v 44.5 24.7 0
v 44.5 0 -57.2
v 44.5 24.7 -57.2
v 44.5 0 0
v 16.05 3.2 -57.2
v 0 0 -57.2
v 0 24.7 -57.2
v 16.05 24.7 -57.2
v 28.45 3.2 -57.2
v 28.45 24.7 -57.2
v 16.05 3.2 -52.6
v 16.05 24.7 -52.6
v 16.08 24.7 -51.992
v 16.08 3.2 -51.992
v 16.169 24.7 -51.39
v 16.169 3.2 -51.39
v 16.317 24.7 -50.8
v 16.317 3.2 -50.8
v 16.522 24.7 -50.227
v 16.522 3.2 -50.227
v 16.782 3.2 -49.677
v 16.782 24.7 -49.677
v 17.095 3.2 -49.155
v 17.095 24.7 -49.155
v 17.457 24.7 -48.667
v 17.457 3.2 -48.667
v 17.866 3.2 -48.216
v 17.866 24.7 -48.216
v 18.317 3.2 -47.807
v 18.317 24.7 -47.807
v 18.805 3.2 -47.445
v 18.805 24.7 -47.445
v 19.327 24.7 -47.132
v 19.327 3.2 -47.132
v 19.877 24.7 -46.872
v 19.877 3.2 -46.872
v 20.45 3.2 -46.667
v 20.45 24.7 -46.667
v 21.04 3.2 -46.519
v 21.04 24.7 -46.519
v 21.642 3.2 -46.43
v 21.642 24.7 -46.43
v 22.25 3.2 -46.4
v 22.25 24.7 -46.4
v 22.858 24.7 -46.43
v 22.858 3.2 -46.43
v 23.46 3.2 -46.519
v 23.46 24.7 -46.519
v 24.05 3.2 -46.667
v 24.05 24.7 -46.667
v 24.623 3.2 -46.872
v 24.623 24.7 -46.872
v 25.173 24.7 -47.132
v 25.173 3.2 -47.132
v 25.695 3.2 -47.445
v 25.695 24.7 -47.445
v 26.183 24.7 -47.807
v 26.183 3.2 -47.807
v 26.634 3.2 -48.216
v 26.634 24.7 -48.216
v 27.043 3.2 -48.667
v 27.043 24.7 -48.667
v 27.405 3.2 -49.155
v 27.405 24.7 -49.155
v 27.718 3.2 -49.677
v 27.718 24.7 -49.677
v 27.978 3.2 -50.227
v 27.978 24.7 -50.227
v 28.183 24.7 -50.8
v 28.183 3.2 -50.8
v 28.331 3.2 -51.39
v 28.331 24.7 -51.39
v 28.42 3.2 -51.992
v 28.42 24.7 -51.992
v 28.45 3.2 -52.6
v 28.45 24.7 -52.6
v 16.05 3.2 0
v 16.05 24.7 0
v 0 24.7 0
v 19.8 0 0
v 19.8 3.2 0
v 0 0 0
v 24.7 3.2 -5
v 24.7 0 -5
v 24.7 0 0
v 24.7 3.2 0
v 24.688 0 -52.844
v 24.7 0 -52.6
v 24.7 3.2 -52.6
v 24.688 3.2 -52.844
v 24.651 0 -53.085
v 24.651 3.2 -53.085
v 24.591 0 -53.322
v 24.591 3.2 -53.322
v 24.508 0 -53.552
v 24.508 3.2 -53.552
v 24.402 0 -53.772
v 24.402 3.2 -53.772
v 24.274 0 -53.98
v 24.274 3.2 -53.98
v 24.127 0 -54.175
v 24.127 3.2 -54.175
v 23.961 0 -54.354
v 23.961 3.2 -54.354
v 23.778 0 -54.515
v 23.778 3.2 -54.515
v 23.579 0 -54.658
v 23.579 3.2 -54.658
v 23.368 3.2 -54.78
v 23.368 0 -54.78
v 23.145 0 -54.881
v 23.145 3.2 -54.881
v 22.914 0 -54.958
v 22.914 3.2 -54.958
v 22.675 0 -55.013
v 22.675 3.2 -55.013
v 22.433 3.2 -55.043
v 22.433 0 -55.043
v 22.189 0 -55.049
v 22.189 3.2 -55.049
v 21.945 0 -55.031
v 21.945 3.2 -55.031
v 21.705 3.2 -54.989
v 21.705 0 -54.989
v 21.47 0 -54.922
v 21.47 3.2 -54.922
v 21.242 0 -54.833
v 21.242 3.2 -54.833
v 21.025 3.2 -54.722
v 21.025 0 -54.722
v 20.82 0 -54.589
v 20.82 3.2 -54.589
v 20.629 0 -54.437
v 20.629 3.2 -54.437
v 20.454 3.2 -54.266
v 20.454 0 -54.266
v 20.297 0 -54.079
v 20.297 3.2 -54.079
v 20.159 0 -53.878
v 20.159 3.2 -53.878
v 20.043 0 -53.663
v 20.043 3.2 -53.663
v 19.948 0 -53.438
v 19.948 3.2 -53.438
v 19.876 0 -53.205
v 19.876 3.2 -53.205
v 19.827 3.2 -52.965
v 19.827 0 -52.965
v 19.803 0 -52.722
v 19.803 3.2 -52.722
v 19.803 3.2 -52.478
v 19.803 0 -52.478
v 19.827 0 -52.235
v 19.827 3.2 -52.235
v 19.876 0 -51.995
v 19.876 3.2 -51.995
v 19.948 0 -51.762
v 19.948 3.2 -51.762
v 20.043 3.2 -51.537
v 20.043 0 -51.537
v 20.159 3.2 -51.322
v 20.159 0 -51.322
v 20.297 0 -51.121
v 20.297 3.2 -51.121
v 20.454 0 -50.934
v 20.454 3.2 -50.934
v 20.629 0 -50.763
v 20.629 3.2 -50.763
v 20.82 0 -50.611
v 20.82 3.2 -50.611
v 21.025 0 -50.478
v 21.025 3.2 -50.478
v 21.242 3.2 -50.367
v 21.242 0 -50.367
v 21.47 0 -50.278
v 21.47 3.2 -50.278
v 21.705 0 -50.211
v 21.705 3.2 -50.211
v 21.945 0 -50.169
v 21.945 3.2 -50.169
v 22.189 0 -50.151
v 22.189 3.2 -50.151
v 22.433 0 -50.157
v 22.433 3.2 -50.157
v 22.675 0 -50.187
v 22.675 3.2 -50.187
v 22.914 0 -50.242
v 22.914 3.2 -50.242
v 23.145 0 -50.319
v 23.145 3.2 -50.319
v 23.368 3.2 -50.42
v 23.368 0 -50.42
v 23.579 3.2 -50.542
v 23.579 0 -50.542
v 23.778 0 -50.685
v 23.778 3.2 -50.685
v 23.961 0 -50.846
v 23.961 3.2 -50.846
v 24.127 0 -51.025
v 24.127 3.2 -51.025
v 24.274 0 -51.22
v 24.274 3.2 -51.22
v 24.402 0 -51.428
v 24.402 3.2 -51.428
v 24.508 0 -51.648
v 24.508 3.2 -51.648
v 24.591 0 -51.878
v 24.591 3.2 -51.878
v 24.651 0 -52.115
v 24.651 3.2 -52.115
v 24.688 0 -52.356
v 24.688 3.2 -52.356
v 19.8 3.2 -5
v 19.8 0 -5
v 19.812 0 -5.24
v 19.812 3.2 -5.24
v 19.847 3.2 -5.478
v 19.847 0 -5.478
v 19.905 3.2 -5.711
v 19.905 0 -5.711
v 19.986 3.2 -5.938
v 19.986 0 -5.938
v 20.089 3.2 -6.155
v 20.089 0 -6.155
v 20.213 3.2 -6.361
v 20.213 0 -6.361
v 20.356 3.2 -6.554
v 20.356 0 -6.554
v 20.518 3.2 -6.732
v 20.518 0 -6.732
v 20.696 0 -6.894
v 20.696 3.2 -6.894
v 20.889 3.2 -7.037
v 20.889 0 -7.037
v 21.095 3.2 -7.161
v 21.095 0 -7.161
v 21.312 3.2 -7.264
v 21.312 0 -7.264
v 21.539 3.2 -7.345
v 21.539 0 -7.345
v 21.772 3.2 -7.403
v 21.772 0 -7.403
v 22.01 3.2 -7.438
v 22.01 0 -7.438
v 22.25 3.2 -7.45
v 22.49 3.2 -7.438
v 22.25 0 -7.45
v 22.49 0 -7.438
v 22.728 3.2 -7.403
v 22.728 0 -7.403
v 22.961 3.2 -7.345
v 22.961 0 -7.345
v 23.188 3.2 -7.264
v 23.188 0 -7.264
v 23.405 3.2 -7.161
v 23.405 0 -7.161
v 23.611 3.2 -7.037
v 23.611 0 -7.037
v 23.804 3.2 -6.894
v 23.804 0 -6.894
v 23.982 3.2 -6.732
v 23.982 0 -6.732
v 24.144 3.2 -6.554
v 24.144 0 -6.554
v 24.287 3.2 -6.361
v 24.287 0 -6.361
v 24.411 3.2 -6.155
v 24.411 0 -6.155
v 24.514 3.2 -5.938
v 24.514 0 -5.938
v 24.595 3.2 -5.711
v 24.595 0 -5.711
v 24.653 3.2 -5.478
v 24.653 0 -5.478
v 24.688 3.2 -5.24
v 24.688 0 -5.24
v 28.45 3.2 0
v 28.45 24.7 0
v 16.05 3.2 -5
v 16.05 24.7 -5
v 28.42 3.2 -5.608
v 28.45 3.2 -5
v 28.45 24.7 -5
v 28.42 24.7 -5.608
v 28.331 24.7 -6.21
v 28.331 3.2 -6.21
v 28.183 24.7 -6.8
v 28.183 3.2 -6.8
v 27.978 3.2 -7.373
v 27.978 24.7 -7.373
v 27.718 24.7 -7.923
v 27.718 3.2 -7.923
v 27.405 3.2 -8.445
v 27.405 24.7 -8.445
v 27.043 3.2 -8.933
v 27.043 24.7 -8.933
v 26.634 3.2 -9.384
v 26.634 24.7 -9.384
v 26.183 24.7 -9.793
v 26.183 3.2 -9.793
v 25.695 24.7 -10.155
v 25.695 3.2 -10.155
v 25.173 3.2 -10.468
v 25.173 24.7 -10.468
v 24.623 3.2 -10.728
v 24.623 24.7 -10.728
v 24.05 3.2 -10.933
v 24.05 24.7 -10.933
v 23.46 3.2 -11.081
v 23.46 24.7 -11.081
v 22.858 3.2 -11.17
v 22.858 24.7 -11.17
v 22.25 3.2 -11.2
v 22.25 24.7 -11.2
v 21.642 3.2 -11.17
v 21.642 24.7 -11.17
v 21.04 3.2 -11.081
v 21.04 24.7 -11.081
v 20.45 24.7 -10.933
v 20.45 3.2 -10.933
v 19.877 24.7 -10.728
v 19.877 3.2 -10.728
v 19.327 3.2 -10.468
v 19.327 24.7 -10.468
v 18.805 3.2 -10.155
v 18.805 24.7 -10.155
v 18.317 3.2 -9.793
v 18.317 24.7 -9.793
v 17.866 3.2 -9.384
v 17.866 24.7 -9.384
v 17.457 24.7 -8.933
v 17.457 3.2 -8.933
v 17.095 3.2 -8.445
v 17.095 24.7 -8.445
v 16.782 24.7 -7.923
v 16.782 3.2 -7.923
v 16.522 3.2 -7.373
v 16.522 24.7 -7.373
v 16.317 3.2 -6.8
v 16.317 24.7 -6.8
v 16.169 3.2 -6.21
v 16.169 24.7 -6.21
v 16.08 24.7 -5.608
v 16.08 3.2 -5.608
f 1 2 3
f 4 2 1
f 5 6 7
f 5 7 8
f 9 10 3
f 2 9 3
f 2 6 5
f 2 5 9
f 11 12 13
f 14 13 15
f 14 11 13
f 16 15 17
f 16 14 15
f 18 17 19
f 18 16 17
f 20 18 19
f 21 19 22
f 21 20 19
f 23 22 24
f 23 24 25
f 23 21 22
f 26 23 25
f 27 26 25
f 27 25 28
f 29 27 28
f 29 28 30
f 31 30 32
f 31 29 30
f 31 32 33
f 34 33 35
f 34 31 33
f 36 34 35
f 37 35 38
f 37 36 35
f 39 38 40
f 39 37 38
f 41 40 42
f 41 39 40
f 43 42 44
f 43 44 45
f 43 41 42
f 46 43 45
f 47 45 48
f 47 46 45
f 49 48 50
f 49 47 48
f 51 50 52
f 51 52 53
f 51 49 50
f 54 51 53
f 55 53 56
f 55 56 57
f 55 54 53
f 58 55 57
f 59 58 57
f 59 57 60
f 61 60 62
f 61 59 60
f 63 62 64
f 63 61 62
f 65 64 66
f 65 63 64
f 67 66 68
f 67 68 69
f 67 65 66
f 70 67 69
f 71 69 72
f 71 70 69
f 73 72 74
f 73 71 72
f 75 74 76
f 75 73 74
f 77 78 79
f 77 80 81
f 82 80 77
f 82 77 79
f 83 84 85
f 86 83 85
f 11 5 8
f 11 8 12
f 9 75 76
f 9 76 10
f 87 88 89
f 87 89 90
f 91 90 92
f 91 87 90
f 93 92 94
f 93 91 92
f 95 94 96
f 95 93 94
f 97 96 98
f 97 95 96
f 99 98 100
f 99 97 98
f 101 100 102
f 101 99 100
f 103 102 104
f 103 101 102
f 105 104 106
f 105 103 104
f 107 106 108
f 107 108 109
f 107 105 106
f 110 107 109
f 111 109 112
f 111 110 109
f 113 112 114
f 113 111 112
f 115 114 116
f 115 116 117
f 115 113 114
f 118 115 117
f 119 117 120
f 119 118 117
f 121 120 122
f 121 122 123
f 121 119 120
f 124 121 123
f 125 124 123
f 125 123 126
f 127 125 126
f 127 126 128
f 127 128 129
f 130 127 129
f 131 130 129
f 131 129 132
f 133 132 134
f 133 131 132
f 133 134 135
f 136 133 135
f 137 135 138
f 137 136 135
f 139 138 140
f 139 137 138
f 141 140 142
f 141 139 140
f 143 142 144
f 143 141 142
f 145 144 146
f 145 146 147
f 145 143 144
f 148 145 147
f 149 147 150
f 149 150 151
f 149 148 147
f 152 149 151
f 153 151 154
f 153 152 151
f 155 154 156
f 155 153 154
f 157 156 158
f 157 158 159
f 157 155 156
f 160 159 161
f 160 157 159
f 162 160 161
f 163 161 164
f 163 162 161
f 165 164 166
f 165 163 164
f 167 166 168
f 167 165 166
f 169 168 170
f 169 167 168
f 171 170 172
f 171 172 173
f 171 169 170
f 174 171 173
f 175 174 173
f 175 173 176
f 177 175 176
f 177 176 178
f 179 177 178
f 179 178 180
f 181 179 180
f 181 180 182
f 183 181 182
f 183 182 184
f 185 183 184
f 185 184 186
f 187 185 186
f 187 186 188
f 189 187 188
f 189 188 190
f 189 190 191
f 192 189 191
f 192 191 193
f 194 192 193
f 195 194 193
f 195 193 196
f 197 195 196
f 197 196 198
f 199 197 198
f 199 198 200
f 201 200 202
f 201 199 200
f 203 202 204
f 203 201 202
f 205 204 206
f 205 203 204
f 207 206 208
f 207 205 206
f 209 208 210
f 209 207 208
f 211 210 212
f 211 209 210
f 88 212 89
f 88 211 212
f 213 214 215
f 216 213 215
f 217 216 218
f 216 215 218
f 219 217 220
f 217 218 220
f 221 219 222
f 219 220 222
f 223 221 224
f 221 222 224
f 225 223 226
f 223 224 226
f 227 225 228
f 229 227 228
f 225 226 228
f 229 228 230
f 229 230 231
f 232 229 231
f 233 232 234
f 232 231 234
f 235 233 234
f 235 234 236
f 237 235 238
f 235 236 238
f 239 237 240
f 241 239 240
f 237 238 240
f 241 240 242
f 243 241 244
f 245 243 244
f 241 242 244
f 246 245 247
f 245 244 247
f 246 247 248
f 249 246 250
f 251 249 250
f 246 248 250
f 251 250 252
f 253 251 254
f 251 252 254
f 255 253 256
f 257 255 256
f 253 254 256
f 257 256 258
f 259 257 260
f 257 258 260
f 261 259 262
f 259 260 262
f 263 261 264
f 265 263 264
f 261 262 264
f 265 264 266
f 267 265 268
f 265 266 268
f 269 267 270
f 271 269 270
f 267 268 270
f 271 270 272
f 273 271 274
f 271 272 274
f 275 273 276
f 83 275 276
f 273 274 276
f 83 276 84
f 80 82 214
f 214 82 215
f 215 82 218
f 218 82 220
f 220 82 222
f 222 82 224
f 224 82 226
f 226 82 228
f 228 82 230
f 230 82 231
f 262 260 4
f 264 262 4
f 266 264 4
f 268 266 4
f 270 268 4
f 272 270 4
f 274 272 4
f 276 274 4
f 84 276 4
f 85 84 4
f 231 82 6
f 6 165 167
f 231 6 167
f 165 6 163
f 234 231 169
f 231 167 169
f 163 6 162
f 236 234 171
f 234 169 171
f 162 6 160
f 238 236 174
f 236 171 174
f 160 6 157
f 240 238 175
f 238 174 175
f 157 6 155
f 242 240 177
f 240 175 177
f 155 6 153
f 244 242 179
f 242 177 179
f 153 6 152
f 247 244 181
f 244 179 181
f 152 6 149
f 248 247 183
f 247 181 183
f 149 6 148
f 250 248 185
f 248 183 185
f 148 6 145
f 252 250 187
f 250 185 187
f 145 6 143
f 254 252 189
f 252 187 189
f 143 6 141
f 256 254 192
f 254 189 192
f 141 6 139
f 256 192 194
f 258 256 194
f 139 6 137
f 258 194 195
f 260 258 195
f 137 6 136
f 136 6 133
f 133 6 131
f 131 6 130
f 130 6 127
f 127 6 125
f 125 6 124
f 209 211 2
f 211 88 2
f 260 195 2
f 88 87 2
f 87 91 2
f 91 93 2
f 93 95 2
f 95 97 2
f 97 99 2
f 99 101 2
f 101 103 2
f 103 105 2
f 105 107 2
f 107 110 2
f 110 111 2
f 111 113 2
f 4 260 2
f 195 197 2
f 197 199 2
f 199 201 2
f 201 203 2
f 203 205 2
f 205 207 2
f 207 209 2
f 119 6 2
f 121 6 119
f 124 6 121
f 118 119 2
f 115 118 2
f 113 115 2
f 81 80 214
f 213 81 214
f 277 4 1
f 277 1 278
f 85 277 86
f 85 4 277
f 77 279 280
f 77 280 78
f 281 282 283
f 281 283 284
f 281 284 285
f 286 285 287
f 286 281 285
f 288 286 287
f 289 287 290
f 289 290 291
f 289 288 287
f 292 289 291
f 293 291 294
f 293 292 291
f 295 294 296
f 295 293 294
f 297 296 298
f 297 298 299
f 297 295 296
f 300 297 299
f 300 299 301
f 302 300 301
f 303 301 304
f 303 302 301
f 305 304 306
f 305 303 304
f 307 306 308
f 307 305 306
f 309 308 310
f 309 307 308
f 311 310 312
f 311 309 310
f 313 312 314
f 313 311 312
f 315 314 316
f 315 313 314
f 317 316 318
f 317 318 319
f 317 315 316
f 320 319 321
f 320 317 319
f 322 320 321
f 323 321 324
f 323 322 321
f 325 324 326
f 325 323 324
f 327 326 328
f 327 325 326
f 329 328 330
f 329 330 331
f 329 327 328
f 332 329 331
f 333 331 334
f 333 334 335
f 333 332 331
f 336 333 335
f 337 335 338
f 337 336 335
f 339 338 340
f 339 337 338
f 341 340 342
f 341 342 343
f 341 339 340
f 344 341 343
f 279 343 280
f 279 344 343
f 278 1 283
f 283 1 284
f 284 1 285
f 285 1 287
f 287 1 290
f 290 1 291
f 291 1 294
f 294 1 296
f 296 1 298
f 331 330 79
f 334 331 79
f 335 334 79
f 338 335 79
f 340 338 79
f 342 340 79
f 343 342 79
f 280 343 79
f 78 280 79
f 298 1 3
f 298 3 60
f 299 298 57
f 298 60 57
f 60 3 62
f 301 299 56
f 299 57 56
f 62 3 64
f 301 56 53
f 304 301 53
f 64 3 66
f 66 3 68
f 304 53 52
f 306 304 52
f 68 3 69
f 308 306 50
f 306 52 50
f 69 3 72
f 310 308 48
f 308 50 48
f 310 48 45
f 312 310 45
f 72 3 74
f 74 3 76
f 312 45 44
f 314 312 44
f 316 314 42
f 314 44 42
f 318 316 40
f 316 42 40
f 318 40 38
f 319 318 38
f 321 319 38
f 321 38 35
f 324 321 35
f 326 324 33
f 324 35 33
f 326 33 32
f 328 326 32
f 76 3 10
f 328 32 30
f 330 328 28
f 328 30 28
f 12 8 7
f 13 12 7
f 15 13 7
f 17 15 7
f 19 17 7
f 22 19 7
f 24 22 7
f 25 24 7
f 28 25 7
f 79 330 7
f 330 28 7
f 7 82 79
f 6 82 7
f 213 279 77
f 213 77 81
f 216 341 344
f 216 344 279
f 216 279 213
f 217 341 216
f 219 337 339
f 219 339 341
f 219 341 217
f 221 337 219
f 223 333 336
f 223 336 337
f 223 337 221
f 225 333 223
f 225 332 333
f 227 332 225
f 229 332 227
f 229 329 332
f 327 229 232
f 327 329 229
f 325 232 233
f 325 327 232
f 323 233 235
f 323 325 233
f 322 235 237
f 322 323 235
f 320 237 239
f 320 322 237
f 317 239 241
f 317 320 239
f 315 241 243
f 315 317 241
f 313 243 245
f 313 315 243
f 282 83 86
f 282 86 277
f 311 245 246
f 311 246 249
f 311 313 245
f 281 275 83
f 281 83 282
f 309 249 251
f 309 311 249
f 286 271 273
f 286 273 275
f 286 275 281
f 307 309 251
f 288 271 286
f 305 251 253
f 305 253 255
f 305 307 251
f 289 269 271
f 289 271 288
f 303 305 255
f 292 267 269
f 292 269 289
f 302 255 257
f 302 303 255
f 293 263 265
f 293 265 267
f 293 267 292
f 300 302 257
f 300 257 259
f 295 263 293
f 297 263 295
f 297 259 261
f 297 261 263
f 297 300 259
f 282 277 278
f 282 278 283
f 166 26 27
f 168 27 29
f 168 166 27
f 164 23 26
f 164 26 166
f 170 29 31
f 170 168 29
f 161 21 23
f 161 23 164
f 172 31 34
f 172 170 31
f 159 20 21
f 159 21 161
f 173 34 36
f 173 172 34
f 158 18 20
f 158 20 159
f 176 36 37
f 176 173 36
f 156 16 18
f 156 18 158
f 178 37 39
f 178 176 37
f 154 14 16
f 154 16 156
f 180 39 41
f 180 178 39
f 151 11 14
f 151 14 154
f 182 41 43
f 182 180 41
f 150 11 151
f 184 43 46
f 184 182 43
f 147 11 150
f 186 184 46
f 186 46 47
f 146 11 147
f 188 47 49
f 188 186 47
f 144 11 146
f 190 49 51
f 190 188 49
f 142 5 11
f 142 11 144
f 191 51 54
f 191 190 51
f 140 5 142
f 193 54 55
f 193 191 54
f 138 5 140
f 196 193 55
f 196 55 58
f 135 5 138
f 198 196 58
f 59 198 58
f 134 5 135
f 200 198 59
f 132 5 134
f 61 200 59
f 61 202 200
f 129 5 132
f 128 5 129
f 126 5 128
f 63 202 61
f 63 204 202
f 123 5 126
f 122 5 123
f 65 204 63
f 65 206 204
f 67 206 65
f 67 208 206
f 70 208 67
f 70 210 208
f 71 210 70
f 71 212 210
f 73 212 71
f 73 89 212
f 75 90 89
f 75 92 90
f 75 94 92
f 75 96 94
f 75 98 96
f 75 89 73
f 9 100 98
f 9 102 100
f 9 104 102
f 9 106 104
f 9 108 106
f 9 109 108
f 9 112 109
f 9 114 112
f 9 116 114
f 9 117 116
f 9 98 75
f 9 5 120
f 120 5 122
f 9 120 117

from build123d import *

# Parameters (mm, degrees)
SKETCH1_R           = 2.45
BOSS_EXTRUDE1_DEPTH = 3.2
BOSS_EXTRUDE2_DEPTH = 21.5


with BuildPart() as part:
    # Sketch1 → Boss-Extrude1 (new body)
    with BuildSketch(Plane(origin=(0, 0, 0), x_dir=(1, 0, 0), z_dir=(0, 1, 0))):
        with BuildLine():
            Line((0, 0), (19.8, 0))
            Line((19.8, 0), (19.8, 5))
            ThreePointArc((19.8, 5), (22.25, 7.45), (24.7, 5))
            Line((24.7, 5), (24.7, 0))
            Line((24.7, 0), (44.5, 0))
            Line((44.5, 0), (44.5, 57.2))
            Line((44.5, 57.2), (28.45, 57.2))
            Line((28.45, 57.2), (16.05, 57.2))
            Line((16.05, 57.2), (0, 57.2))
            Line((0, 57.2), (0, 0))
        make_face()
        with Locations((22.25, 52.6)):
            Circle(SKETCH1_R, mode=Mode.SUBTRACT)
    extrude(amount=BOSS_EXTRUDE1_DEPTH)

    # Sketch2 → Boss-Extrude2 (add)
    with BuildSketch(Plane(origin=(0, 3.2, 0), x_dir=(1, 0, 0), z_dir=(0, 1, 0))):
        with BuildLine():
            Line((0, 0), (0, 57.2))
            Line((0, 57.2), (16.05, 57.2))
            Line((16.05, 57.2), (16.05, 52.6))
            ThreePointArc((16.05, 52.6), (22.25, 46.4), (28.45, 52.6))
            Line((28.45, 52.6), (28.45, 57.2))
            Line((28.45, 57.2), (44.5, 57.2))
            Line((44.5, 57.2), (44.5, 0))
            Line((44.5, 0), (28.45, 0))
            Line((28.45, 0), (28.45, 5))
            ThreePointArc((28.45, 5), (22.25, 11.2), (16.05, 5))
            Line((16.05, 5), (16.05, 0))
            Line((16.05, 0), (0, 0))
        make_face()
    extrude(amount=BOSS_EXTRUDE2_DEPTH)


solid = part.part
